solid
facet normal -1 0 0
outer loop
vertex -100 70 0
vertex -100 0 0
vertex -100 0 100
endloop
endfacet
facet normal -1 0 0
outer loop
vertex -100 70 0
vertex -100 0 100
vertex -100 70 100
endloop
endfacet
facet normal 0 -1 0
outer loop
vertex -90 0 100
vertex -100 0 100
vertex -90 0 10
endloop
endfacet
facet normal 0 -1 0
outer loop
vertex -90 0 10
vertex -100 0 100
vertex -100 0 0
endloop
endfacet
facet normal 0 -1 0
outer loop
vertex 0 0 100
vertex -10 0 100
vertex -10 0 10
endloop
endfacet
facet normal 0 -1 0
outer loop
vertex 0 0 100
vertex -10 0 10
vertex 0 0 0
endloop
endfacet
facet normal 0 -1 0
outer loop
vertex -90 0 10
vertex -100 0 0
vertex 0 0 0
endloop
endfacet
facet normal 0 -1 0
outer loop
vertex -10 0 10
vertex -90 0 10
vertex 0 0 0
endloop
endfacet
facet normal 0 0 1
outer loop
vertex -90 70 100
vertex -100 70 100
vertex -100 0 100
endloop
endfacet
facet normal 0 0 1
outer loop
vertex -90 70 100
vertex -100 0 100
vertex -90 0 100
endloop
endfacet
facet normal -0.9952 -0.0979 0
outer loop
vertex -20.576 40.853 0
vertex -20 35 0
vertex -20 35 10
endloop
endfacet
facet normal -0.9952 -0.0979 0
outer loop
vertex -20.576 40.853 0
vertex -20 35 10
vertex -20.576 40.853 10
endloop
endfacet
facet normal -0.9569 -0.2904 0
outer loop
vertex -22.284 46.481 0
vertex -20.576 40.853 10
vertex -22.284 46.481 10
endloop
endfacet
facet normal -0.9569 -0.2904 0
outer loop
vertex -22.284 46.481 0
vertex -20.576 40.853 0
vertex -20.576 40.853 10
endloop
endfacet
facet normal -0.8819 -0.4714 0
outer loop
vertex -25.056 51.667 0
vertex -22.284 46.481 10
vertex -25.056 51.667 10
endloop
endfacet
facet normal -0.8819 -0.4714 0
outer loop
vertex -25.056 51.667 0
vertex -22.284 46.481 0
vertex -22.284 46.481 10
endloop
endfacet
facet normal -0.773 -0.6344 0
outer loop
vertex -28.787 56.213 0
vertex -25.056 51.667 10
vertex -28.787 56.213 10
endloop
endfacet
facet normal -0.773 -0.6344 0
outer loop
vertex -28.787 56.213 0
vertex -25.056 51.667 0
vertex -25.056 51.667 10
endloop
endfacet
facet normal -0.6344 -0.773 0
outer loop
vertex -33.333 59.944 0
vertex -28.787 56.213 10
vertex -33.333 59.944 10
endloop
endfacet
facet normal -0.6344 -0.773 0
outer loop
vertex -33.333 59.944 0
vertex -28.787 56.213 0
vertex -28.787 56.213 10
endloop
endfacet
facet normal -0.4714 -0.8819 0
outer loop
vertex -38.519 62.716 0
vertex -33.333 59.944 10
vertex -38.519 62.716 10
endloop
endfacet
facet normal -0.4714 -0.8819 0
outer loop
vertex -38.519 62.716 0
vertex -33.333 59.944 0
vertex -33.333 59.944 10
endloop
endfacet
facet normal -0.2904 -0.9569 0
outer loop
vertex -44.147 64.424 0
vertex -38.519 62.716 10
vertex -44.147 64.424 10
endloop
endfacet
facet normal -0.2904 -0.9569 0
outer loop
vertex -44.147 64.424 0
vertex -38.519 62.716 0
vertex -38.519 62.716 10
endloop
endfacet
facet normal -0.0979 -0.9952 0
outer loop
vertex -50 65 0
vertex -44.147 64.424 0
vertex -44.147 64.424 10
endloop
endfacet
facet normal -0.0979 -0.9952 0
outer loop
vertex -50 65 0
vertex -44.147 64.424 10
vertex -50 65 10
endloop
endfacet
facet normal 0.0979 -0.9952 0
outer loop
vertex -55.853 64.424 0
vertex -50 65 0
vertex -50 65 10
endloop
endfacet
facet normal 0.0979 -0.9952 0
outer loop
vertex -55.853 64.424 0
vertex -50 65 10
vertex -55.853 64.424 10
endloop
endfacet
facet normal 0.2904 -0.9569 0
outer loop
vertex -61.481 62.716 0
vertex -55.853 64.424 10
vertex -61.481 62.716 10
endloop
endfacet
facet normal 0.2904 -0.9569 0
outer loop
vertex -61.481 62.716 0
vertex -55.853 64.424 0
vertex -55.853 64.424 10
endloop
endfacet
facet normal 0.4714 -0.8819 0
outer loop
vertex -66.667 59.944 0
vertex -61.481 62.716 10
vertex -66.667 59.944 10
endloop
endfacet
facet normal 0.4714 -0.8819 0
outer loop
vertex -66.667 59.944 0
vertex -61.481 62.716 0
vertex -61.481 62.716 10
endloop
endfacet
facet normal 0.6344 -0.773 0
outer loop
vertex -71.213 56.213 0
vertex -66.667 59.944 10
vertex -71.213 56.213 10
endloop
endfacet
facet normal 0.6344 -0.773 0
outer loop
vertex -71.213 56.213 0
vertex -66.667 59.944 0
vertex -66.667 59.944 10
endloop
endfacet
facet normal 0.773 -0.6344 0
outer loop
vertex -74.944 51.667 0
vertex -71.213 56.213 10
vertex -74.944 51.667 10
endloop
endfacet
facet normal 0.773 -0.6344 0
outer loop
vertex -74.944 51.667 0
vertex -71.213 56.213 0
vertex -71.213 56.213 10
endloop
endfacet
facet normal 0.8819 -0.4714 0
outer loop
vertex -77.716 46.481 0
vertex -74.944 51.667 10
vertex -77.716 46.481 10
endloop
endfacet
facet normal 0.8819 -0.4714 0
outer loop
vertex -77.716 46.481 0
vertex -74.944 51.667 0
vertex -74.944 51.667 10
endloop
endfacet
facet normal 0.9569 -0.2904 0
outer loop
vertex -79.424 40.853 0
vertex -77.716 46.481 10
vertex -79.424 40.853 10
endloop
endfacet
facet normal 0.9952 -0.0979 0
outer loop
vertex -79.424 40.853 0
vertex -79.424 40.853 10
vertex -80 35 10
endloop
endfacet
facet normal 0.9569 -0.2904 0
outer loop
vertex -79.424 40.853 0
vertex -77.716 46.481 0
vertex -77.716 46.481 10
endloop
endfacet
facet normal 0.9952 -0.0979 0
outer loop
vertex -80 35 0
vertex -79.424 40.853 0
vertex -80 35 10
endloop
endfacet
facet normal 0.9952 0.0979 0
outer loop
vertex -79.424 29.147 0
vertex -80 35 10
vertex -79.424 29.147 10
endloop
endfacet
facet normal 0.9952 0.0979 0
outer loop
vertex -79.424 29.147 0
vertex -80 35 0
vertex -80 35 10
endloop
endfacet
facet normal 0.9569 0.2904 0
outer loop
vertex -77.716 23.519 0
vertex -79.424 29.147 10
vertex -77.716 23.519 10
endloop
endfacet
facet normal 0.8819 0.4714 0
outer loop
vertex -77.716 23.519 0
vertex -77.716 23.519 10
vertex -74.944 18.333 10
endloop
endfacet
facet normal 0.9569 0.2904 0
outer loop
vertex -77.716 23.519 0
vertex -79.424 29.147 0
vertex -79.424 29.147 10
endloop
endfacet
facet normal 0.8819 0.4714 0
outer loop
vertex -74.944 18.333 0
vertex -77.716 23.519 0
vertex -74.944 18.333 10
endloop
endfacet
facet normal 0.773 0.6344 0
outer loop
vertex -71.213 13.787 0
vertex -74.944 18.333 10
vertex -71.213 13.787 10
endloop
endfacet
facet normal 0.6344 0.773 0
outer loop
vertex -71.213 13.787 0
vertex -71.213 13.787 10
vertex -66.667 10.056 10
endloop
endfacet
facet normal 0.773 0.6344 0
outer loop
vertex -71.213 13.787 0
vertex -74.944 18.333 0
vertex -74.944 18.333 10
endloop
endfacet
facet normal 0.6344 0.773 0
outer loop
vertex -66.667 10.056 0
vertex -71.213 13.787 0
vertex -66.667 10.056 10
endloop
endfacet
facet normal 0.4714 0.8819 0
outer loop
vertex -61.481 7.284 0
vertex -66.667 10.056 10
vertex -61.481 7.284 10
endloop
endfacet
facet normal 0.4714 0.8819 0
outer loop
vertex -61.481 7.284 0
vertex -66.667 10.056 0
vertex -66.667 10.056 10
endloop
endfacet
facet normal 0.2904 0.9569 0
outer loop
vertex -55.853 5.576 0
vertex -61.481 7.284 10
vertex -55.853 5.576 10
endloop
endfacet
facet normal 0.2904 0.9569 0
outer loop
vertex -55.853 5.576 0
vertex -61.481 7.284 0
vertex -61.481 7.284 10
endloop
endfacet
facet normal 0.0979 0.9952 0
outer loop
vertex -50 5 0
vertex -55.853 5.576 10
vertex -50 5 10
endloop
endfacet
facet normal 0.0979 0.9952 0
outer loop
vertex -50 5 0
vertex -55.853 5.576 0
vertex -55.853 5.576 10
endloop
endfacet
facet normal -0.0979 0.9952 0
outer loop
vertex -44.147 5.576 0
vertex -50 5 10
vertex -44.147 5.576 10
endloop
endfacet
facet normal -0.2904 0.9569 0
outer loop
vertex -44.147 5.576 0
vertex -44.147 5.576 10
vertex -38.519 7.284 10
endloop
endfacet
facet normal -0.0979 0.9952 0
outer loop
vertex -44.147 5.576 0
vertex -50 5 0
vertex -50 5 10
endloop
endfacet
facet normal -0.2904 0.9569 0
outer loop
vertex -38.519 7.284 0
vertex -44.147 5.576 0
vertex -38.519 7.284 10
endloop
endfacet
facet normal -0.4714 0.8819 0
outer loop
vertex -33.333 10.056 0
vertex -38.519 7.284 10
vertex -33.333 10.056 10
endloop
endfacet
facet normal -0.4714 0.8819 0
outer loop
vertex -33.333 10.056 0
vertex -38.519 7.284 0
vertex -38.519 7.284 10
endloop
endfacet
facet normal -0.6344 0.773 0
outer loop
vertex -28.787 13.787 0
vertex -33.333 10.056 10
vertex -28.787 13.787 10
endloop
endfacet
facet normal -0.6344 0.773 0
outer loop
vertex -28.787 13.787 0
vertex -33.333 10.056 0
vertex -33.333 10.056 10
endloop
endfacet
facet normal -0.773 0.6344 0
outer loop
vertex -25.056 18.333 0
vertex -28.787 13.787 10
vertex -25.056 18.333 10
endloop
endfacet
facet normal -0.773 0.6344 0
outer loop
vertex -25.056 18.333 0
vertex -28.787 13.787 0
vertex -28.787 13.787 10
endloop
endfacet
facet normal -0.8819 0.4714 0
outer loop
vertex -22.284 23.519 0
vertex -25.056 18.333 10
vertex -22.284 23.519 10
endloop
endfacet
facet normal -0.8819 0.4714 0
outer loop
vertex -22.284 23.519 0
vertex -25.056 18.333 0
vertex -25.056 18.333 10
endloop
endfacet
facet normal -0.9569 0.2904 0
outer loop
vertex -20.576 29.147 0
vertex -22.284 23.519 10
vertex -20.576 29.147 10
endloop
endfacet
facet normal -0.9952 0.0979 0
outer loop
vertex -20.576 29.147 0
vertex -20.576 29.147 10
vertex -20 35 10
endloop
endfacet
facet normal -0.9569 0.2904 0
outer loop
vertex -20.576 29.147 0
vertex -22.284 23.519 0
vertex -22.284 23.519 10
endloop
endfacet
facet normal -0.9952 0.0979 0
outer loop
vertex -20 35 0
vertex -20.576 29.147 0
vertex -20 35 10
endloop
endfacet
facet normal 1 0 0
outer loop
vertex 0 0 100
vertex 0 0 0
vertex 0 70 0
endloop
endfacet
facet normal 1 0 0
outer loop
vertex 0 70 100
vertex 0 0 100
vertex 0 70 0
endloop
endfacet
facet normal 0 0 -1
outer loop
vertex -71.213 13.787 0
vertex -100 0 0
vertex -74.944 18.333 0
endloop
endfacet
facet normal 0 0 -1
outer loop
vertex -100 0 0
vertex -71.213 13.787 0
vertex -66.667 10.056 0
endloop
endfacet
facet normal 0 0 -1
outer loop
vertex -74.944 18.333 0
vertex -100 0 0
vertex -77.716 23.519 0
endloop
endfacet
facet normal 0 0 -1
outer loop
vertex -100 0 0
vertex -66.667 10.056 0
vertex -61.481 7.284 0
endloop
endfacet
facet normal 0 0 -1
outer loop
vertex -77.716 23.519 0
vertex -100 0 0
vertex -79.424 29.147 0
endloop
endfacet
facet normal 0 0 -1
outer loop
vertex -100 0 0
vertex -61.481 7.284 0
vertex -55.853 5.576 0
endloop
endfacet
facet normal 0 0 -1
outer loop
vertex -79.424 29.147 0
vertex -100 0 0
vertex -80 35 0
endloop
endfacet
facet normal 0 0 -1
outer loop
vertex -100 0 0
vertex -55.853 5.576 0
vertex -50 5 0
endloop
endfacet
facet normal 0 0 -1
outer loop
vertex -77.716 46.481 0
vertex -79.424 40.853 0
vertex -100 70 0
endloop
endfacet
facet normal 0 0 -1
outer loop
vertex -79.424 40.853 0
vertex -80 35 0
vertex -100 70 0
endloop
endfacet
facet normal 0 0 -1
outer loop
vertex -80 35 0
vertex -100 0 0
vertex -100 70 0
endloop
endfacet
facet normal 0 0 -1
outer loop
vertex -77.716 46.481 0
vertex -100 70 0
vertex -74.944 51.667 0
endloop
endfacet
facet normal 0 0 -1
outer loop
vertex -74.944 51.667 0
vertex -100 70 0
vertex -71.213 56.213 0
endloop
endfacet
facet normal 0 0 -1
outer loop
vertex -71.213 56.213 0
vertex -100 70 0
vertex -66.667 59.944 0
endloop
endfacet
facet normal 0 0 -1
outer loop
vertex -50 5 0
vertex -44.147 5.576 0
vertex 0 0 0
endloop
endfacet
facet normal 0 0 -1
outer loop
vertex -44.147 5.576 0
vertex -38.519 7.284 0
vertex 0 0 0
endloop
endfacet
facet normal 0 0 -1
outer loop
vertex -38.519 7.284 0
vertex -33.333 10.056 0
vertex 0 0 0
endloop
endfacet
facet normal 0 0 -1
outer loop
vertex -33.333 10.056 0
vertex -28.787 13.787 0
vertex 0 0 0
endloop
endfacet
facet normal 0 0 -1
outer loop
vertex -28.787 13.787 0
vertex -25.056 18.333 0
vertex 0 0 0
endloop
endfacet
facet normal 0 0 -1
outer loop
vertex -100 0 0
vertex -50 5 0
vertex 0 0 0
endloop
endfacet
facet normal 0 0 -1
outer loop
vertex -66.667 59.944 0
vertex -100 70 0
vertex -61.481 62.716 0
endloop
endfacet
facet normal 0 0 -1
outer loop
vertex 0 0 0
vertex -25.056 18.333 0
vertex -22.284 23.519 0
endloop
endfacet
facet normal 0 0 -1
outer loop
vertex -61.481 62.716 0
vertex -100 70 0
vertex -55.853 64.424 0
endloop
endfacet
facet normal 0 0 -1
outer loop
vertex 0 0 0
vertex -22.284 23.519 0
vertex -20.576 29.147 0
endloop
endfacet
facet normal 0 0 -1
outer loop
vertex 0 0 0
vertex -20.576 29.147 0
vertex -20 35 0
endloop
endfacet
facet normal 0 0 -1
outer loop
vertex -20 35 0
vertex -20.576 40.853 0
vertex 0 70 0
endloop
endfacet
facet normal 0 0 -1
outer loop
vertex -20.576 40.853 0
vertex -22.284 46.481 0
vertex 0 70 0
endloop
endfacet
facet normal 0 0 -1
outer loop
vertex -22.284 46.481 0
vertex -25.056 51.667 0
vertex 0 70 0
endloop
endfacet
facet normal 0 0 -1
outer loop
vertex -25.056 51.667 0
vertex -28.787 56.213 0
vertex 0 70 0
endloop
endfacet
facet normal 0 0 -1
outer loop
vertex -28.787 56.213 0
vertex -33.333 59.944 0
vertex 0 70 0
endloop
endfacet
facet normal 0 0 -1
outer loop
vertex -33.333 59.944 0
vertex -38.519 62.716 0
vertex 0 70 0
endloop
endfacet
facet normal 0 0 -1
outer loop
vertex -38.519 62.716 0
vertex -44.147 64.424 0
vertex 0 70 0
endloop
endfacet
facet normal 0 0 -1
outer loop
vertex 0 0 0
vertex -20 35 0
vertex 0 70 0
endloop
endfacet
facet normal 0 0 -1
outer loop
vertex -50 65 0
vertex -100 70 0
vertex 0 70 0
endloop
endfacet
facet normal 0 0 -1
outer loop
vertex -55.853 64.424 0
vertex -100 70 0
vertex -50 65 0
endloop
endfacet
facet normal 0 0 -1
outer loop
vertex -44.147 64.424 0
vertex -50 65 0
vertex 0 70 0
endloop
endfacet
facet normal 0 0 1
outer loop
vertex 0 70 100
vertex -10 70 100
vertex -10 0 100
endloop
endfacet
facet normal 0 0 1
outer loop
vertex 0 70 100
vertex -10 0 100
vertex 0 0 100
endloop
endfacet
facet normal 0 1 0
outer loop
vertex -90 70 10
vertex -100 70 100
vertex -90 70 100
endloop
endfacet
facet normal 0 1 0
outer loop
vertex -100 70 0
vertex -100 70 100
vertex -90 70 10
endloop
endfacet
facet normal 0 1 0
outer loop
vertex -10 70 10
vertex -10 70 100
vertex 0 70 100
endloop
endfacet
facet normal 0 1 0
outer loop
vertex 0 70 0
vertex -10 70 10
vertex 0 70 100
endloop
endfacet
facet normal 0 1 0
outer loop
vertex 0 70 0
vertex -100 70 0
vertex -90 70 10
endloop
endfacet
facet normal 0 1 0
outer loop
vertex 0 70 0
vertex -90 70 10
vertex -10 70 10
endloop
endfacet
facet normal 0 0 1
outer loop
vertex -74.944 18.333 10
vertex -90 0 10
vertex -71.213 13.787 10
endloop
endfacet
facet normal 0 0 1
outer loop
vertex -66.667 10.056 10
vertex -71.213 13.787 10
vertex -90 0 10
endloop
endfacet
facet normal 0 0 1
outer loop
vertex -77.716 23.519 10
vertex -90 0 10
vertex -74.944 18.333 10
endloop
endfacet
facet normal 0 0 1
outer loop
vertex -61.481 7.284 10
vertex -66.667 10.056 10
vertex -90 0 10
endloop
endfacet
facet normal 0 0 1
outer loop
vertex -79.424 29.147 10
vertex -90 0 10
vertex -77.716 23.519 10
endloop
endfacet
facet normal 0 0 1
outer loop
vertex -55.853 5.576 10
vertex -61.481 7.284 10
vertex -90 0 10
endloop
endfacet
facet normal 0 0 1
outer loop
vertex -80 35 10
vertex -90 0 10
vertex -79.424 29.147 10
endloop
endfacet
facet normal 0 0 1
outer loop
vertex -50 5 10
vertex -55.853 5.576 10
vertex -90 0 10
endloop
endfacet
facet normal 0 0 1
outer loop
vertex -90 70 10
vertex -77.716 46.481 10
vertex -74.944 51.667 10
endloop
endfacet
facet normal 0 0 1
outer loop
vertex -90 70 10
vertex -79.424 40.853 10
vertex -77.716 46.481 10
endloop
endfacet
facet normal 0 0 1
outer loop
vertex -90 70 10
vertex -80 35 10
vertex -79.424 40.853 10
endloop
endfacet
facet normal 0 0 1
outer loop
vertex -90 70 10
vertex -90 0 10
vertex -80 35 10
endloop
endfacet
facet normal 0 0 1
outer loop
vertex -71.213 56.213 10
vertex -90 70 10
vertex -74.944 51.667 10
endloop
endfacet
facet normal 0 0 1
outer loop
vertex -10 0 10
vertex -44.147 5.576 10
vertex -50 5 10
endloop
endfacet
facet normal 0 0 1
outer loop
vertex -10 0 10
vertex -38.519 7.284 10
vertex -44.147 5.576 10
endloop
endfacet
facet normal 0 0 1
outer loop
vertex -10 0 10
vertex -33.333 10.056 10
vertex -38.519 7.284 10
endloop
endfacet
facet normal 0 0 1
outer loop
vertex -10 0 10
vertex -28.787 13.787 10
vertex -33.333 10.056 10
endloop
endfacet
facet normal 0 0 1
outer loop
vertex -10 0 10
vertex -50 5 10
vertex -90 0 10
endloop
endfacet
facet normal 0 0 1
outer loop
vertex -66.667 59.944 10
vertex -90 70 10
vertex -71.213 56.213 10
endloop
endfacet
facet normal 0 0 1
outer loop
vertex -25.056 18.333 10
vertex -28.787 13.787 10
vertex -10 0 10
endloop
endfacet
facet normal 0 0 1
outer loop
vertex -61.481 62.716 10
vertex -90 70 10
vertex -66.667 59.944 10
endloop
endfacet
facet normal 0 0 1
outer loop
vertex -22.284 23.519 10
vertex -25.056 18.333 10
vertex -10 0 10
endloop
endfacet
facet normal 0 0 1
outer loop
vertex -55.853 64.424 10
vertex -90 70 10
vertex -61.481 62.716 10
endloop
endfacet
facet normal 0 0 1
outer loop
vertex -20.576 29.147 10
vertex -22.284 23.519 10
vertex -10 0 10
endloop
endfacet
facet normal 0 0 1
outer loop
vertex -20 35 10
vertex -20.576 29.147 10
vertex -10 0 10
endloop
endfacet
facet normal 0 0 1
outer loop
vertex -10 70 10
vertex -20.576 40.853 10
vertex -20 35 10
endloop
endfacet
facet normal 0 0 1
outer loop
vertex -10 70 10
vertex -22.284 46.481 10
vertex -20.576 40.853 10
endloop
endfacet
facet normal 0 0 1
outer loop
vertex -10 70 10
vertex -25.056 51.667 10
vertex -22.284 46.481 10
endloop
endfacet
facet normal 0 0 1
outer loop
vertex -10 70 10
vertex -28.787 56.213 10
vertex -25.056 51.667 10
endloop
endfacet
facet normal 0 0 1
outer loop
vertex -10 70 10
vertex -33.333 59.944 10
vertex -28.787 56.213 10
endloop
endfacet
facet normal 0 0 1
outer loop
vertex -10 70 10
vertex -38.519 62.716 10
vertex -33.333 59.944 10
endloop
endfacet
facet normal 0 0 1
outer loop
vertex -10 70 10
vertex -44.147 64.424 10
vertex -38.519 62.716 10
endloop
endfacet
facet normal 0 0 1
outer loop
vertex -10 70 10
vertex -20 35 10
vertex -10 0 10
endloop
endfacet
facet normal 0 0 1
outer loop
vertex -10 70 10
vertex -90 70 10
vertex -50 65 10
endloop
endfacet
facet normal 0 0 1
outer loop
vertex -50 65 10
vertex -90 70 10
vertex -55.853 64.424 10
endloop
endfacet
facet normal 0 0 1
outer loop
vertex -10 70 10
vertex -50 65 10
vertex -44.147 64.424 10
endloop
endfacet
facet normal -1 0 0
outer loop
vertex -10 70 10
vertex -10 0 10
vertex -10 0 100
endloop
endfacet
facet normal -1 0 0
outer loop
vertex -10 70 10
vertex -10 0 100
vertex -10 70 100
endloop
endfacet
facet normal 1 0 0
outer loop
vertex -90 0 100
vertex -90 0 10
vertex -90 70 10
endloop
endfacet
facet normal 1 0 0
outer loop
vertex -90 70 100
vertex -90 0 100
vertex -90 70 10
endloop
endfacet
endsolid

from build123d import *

# Parameters (mm, degrees)
ESQUISSE1_W             = 80
ESQUISSE1_H             = 70
BOSS_EXTRU_2_DEPTH      = 10
ESQUISSE1_4_W           = 10
ESQUISSE1_4_H           = 70
BOSS_EXTRU_3_DEPTH      = 100
ESQUISSE4_R             = 30
ENL_V_MAT_EXTRU_1_DEPTH = 10


with BuildPart() as part:
    # Esquisse1 → Boss.-Extru.2 (new body)
    with BuildSketch(Plane.XY):
        with Locations((-50, 35)):
            Rectangle(ESQUISSE1_W, ESQUISSE1_H)
    extrude(amount=BOSS_EXTRU_2_DEPTH)

    # Esquisse1<4> → Boss.-Extru.3 (add)
    with BuildSketch(Plane.XY):
        with Locations((-5, 35)):
            Rectangle(ESQUISSE1_4_W, ESQUISSE1_4_H)
        with Locations((-95, 35)):
            Rectangle(ESQUISSE1_4_W, ESQUISSE1_4_H)
    extrude(amount=BOSS_EXTRU_3_DEPTH)

    # Esquisse4 → Enlèv. mat.-Extru.1 (cut)
    with BuildSketch(Plane.XY):
        with Locations((-50, 35)):
            Circle(ESQUISSE4_R)
    extrude(amount=ENL_V_MAT_EXTRU_1_DEPTH, mode=Mode.SUBTRACT)


solid = part.part
